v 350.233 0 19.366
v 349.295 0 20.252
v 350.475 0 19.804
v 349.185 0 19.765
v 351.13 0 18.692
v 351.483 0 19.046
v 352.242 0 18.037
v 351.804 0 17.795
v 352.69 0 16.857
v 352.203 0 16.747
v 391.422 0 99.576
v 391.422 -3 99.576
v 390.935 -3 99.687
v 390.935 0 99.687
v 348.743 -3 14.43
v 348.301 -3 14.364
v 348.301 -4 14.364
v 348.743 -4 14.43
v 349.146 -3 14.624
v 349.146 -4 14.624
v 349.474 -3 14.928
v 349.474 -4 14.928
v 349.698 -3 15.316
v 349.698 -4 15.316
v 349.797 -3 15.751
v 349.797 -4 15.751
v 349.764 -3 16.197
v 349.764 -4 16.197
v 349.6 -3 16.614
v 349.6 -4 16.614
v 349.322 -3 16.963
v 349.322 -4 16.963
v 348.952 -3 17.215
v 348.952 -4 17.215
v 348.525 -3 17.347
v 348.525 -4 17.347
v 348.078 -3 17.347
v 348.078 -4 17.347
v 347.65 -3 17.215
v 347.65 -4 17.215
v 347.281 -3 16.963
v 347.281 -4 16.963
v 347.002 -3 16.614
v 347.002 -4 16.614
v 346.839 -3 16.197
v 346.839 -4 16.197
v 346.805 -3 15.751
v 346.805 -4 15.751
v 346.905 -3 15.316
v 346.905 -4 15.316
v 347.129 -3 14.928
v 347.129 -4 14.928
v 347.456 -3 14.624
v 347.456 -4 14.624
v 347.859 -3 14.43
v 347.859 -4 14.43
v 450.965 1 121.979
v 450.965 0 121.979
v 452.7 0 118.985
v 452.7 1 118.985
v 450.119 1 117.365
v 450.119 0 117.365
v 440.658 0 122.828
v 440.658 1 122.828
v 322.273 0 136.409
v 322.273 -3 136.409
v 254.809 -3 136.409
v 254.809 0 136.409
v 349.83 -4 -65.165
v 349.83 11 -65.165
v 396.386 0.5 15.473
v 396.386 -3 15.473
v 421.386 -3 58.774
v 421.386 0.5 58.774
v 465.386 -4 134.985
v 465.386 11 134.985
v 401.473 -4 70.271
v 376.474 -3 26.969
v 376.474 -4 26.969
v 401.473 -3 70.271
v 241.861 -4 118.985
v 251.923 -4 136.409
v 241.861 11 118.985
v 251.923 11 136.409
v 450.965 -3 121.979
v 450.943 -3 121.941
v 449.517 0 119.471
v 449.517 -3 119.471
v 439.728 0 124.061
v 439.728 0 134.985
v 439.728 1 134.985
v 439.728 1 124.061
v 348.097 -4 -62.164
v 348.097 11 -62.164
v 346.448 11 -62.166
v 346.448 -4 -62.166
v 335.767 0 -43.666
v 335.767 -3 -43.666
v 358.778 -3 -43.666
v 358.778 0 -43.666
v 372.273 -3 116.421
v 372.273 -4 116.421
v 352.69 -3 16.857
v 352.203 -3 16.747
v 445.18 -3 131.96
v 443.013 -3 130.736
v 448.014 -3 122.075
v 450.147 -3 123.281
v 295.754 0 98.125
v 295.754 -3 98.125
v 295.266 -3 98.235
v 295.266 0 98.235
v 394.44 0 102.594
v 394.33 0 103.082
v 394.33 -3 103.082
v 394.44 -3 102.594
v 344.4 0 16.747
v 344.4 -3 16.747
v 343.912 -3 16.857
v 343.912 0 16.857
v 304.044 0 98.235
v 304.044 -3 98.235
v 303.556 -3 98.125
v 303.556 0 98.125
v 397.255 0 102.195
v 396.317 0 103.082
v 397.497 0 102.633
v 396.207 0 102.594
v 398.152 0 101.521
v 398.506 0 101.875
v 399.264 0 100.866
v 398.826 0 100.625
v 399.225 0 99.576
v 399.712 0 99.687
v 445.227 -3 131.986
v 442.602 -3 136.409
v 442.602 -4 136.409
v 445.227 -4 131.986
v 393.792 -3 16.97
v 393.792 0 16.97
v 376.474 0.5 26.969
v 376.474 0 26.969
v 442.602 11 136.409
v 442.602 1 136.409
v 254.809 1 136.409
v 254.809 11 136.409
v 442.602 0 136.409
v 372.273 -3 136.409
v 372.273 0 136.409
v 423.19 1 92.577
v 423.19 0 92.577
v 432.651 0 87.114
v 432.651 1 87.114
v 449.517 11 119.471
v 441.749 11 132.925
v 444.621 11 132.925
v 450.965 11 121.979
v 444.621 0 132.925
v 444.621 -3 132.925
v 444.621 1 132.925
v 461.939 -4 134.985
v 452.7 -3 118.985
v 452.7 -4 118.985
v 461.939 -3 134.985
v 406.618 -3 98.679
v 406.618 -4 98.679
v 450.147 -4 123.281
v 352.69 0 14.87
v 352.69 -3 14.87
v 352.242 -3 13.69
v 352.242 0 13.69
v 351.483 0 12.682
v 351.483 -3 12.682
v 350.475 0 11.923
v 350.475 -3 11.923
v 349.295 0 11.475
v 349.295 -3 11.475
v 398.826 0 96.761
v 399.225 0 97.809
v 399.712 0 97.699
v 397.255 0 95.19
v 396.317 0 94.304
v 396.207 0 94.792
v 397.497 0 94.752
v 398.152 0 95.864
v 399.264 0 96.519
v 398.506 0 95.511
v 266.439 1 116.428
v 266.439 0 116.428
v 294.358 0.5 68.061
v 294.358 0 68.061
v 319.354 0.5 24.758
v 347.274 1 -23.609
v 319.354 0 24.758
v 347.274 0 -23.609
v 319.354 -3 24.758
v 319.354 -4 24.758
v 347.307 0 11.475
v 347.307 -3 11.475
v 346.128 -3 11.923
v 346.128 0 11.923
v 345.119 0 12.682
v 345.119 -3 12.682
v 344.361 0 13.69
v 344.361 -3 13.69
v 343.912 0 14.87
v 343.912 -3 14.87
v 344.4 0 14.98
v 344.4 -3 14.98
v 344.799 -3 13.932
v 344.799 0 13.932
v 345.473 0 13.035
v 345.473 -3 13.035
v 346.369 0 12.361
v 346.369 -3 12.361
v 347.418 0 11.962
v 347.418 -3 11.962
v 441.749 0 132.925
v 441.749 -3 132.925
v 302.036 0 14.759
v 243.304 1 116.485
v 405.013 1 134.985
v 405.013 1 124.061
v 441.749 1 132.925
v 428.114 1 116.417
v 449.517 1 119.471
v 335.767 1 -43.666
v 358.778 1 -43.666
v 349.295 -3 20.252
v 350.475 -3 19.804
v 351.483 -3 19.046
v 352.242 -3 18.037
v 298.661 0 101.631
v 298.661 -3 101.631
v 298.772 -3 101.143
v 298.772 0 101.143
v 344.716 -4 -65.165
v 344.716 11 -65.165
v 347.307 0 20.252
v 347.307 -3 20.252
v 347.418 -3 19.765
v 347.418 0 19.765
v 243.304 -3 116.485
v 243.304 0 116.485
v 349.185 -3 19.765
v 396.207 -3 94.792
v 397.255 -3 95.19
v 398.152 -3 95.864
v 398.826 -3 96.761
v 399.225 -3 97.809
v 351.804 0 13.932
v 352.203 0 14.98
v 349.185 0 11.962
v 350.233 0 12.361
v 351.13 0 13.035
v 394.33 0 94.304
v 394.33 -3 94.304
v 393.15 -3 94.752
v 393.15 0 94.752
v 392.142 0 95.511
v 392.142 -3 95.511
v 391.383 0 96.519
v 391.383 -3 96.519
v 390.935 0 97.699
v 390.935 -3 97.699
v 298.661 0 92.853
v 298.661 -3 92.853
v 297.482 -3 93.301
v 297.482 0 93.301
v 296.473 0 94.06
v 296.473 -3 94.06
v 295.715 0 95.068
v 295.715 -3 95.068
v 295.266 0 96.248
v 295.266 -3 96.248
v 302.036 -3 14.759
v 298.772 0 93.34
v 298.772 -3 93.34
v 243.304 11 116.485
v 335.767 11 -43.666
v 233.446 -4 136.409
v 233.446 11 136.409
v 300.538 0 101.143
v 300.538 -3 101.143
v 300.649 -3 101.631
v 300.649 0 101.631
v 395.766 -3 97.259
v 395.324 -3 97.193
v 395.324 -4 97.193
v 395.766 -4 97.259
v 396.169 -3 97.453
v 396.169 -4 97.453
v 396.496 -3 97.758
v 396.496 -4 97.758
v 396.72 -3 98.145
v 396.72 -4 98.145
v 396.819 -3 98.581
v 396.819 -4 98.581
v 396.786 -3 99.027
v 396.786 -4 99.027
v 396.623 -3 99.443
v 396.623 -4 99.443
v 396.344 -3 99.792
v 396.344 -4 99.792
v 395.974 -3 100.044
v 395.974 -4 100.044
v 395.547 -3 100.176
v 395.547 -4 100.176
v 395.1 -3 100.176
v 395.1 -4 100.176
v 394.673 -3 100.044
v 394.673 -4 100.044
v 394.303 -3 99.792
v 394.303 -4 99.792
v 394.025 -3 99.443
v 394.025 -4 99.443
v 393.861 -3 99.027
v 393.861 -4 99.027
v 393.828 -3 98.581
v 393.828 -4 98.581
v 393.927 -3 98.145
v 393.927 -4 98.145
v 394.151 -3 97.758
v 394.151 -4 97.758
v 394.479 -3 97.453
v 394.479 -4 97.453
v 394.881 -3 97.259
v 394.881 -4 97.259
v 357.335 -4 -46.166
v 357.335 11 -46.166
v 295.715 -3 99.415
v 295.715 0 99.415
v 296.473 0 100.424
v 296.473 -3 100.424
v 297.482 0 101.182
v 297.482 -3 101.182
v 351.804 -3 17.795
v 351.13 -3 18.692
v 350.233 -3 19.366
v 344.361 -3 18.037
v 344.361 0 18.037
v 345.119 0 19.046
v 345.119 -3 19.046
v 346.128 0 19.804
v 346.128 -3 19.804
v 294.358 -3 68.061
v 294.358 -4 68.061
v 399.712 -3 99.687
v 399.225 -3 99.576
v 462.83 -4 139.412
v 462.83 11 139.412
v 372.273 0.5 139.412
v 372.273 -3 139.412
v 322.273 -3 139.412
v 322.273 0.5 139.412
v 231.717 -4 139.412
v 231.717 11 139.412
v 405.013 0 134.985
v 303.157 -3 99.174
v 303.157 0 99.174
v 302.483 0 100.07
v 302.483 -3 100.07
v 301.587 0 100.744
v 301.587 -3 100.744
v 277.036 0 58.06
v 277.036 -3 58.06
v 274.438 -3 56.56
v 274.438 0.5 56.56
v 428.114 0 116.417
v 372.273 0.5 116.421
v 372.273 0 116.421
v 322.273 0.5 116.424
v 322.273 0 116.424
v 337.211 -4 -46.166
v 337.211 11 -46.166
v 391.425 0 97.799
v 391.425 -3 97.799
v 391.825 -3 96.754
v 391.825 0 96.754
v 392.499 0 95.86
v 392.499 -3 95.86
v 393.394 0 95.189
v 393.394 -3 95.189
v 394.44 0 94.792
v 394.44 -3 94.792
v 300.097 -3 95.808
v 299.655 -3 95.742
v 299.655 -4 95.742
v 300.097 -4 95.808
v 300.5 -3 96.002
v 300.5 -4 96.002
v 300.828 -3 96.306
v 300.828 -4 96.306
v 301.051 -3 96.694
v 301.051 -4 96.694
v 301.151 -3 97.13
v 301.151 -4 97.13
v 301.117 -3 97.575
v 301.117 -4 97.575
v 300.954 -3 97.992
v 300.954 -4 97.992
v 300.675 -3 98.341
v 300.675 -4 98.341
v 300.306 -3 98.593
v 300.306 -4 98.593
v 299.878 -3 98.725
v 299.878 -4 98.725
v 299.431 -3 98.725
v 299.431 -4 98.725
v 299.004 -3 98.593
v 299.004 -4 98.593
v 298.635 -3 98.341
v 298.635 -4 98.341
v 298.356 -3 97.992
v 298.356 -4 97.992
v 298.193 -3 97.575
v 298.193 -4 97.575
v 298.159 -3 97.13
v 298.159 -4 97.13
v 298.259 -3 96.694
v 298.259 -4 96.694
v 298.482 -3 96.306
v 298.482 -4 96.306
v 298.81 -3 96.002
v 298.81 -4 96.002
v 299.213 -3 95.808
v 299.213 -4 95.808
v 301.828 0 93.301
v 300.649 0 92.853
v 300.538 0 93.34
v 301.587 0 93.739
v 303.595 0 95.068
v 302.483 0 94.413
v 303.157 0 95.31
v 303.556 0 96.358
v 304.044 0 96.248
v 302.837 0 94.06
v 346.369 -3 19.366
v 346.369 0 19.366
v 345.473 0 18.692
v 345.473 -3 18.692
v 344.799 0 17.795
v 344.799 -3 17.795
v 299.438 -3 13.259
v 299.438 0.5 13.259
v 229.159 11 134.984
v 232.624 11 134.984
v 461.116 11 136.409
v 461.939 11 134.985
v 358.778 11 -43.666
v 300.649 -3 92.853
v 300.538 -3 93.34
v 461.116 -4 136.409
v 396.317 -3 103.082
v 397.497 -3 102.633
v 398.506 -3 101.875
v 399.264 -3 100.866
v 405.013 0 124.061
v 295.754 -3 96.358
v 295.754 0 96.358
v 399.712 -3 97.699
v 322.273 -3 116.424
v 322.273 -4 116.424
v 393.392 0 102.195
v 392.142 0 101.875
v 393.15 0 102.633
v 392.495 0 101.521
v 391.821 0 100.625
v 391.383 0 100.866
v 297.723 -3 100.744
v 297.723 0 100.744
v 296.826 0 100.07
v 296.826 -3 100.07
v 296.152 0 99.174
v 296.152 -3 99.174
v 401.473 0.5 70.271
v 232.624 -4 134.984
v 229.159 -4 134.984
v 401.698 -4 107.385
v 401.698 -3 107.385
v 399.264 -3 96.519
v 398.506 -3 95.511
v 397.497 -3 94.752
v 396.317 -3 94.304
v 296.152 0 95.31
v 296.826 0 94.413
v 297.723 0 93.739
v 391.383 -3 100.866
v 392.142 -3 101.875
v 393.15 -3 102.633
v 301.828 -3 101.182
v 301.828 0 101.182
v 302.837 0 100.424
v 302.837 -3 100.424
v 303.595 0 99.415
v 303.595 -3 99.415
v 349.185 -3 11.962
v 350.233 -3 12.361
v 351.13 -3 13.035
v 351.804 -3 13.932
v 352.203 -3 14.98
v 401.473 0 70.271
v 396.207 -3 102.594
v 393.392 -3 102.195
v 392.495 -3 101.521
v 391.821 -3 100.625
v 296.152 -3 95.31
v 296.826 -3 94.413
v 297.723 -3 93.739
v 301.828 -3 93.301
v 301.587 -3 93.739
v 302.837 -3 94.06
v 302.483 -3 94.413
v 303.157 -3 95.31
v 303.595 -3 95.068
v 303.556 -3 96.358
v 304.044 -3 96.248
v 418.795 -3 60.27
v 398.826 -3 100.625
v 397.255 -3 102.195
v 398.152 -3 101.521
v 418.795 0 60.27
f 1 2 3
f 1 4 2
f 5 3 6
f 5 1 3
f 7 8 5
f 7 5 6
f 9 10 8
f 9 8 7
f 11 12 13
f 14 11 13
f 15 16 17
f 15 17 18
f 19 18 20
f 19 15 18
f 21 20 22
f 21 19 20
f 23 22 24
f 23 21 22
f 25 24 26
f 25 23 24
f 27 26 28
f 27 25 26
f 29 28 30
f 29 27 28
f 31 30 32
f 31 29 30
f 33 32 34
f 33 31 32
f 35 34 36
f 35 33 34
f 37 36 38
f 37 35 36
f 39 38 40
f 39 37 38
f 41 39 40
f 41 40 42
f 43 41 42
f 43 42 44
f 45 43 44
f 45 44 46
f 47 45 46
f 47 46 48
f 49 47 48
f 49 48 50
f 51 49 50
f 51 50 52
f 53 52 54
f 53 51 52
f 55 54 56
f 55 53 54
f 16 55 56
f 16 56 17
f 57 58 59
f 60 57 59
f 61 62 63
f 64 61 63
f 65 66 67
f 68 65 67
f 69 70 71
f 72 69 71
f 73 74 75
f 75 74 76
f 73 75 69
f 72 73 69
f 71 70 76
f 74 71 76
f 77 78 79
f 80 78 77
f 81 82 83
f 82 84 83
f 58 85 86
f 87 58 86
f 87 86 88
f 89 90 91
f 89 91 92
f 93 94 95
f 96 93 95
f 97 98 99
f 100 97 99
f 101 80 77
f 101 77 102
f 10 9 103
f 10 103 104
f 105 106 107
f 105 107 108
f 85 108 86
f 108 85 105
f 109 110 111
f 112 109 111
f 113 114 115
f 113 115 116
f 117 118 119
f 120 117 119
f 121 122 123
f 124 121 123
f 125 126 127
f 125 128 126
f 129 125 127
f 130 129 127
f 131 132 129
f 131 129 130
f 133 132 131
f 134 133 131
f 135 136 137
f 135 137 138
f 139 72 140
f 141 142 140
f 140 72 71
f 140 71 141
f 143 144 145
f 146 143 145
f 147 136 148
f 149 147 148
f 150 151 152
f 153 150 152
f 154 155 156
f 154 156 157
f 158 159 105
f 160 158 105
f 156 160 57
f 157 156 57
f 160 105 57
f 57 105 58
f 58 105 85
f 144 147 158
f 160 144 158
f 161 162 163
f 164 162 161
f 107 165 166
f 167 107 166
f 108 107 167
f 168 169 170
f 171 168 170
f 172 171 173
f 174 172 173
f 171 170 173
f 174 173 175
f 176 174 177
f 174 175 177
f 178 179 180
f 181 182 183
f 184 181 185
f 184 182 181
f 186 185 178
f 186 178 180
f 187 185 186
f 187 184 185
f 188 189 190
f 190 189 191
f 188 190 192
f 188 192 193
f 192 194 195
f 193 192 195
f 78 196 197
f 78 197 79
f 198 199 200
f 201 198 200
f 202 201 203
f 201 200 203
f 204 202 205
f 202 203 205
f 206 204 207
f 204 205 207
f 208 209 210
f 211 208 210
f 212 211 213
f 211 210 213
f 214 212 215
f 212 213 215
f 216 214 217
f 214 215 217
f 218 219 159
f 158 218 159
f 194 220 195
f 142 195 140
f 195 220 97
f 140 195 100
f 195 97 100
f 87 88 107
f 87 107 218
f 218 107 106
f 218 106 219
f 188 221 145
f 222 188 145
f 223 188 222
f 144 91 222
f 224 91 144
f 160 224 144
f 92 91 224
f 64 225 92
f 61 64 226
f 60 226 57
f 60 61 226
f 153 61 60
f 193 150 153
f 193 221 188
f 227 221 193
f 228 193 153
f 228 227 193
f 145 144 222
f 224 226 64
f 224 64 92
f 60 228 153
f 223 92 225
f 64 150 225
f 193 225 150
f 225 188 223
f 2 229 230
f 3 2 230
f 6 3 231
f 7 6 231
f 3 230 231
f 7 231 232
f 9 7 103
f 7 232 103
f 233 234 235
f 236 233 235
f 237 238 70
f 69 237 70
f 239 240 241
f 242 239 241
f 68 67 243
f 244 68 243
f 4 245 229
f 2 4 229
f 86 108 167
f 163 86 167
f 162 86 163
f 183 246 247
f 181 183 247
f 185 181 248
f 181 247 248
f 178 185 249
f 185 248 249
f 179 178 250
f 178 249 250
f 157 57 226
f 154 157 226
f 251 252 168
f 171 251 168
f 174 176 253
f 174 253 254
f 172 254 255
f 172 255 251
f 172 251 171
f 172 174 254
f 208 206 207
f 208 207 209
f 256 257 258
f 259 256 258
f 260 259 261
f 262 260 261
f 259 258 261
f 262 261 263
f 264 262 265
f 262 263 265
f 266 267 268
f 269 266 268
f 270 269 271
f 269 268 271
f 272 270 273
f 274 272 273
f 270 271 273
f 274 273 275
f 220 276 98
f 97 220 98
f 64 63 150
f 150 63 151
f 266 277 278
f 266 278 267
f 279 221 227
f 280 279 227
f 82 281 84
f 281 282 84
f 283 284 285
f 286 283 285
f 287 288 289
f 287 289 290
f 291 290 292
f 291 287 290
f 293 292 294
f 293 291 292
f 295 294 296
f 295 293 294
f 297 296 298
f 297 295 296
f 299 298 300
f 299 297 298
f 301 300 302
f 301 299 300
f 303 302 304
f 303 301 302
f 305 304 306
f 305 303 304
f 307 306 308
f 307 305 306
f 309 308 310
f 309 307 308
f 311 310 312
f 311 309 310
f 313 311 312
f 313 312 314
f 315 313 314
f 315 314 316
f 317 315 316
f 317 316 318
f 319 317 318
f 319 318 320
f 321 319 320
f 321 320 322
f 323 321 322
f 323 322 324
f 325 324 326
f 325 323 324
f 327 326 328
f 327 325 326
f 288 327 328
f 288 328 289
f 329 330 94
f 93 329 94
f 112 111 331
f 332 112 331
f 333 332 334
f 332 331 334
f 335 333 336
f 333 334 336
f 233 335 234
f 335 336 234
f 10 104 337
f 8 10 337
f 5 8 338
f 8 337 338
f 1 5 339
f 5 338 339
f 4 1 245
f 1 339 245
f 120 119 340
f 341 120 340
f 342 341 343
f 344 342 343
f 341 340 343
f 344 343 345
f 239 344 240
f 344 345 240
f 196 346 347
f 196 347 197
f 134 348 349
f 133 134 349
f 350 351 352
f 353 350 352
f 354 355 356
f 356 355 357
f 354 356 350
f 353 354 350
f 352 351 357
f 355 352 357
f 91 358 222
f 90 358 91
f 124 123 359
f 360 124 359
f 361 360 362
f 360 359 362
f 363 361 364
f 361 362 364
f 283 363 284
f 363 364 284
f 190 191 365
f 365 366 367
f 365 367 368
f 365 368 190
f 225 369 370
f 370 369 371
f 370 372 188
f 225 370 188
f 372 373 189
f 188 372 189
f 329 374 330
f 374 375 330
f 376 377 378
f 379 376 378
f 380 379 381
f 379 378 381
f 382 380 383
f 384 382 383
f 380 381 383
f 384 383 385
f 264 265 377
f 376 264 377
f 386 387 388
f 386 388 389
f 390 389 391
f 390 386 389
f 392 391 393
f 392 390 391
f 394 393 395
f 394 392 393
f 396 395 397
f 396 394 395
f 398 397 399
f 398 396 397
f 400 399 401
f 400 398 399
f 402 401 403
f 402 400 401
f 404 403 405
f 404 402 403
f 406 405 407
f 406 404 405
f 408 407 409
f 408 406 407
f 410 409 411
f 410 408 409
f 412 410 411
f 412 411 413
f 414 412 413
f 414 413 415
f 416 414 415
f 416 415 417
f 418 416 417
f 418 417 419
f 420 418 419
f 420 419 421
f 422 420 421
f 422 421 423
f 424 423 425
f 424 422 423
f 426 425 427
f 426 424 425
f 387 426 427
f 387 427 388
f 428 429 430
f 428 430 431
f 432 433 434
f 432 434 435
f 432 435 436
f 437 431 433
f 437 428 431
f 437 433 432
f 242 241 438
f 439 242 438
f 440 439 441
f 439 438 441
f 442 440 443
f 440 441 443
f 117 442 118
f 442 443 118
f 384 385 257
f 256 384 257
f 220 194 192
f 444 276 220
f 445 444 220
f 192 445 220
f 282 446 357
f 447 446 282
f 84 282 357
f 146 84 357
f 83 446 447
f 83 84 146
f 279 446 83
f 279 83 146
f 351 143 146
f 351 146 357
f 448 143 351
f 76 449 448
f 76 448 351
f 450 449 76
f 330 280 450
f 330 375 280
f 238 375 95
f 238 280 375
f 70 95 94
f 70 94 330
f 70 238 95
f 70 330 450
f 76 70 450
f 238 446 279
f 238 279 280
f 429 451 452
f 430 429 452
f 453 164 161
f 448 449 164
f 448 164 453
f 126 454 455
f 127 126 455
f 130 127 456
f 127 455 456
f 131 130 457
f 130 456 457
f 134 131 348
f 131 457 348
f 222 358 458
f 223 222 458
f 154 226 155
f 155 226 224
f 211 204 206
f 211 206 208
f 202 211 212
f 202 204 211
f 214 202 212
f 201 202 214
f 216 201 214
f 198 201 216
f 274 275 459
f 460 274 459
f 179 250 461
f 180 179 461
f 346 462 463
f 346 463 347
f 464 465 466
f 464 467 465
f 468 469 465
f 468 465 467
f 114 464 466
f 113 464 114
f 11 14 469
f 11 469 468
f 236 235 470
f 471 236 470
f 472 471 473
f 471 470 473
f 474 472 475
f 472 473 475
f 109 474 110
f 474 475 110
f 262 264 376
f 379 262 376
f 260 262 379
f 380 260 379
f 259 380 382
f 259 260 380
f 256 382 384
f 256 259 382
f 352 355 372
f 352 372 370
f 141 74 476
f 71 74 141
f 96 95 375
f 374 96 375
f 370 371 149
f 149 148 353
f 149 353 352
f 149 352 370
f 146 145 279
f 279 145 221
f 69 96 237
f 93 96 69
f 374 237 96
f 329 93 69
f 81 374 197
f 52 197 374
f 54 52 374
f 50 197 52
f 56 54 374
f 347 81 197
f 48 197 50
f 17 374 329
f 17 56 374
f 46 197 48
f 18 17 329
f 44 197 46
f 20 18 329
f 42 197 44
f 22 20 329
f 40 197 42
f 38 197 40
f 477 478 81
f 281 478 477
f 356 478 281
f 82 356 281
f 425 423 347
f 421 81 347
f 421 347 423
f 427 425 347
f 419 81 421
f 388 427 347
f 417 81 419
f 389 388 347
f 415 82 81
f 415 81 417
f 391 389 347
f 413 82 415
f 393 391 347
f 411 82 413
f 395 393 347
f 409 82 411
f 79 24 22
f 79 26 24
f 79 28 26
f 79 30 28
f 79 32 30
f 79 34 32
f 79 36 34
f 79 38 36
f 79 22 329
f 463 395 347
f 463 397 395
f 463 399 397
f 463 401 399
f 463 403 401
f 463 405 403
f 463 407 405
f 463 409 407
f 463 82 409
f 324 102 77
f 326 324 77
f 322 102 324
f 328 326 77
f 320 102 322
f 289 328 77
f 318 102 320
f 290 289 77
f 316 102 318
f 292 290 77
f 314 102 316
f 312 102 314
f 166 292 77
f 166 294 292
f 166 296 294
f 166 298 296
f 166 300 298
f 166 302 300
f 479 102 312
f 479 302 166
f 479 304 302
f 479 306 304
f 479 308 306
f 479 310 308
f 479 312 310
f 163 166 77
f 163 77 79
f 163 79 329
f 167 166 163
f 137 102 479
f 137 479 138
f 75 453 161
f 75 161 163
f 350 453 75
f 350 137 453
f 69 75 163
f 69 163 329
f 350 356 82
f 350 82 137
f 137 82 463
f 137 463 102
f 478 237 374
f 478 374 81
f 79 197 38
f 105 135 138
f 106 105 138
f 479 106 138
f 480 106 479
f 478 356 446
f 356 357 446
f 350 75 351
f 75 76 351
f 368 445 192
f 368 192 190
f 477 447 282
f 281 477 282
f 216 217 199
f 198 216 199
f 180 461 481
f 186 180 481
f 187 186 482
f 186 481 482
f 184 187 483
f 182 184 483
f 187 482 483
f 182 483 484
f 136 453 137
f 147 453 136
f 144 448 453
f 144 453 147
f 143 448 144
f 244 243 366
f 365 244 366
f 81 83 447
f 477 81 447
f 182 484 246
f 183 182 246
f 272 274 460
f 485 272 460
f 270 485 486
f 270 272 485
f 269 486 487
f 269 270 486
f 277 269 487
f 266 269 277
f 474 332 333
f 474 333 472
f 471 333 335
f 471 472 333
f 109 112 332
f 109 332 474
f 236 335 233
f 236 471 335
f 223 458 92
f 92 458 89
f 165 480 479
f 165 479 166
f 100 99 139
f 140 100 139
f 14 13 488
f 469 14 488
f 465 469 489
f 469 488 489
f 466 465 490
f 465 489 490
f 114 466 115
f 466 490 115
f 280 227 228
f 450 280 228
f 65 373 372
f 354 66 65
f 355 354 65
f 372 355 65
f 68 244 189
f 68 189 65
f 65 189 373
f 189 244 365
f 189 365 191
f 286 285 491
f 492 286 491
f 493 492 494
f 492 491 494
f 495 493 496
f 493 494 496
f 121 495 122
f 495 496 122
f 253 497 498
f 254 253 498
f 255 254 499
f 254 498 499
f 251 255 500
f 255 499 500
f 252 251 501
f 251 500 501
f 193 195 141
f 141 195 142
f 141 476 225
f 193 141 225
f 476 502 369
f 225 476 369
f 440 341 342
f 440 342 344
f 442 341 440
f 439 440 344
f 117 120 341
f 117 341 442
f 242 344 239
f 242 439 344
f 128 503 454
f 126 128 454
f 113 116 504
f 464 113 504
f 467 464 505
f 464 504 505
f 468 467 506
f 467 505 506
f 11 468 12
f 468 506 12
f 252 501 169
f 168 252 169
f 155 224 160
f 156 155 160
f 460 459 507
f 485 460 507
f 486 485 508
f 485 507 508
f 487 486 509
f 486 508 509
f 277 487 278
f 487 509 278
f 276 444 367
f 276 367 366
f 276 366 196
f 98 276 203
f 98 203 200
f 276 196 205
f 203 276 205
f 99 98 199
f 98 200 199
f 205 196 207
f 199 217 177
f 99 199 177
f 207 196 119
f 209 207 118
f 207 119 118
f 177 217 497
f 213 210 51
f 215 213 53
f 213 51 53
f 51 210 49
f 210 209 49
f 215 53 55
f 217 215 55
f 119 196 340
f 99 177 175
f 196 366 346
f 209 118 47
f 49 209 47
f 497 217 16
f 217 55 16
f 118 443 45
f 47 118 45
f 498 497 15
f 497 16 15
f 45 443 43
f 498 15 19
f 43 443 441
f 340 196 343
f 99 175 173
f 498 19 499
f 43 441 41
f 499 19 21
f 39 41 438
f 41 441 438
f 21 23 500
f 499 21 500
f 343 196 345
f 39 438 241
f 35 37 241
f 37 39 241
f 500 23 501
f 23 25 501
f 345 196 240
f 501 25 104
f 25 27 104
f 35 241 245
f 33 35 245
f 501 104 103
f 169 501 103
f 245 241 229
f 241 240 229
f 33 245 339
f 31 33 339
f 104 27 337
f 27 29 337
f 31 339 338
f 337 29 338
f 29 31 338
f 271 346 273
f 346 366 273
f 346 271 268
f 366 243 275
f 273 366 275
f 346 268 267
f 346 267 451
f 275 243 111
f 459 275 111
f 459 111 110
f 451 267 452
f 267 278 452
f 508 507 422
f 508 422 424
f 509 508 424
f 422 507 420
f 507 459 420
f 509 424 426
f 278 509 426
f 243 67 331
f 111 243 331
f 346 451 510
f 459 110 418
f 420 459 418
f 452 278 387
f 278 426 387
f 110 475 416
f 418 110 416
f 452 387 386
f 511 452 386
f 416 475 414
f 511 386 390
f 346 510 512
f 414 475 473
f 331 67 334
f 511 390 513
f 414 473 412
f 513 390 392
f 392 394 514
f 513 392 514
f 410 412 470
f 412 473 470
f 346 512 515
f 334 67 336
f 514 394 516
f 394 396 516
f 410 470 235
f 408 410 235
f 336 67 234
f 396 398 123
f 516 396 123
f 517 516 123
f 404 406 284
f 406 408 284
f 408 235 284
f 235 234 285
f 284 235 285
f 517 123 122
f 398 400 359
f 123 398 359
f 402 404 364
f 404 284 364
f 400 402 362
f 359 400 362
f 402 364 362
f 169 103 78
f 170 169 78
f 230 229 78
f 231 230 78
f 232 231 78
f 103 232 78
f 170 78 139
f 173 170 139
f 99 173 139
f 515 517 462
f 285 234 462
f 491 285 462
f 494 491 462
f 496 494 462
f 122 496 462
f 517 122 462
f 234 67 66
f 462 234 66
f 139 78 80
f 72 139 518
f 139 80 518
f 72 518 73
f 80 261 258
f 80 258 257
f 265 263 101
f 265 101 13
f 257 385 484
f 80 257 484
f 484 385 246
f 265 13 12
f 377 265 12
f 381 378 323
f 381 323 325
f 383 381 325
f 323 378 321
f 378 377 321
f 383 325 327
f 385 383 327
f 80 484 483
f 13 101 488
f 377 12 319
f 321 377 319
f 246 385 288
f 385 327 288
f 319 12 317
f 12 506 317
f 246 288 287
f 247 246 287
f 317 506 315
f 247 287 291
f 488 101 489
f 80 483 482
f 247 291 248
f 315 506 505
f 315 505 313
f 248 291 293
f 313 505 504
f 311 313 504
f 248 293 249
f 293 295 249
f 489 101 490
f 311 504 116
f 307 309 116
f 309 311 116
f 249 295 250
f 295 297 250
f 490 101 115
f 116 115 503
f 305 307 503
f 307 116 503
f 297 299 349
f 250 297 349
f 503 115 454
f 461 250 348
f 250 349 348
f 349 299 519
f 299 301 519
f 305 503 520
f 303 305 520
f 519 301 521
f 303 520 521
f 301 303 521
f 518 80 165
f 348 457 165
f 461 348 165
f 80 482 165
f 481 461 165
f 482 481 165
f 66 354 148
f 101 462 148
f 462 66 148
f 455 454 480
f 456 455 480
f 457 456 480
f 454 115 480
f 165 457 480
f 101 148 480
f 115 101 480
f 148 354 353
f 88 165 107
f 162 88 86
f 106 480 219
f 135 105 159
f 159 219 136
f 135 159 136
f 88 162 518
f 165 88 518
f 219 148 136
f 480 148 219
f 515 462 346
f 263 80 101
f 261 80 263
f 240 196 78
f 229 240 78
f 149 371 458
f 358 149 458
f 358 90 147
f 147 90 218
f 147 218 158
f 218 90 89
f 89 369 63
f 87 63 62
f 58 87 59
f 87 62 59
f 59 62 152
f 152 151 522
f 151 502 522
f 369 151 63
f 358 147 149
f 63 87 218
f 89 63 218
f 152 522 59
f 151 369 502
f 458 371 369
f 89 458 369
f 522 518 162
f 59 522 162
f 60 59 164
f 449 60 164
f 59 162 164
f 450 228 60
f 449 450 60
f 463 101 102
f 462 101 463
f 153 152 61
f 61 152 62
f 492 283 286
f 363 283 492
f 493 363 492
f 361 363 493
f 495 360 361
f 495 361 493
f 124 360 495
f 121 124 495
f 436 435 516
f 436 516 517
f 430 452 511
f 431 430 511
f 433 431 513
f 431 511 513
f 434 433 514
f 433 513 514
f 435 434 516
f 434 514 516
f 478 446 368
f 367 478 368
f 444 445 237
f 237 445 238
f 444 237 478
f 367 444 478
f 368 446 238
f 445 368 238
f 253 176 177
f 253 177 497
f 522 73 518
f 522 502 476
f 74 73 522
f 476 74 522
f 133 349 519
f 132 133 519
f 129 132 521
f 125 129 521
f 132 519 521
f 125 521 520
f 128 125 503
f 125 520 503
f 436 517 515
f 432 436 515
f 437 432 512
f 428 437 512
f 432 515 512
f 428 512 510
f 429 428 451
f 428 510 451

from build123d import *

# Parameters (mm, degrees)
SKETCH1_W                = 34.714871787
SKETCH1_H                = 10.923666426
BOSS_EXTRUDE1_DEPTH      = 1
BOSS_EXTRUDE2_DEPTH      = 11
BOSS_EXTRUDE3_DEPTH      = 5
BOSS_EXTRUDE3_DEPTH_BACK = 3
SKETCH3_W                = 50
SKETCH3_H                = 7
CUT_EXTRUDE3_DEPTH       = 25
SKETCH5_W                = 50
SKETCH5_H                = 7
CUT_EXTRUDE4_DEPTH       = 25
SKETCH6_W                = 50
SKETCH6_H                = 7
CUT_EXTRUDE5_DEPTH       = 25
SKETCH8_R                = 1.5
BOSS_EXTRUDE5_DEPTH      = 1
BOSS_EXTRUDE10_DEPTH     = 3


with BuildPart() as part:
    # Sketch1 → Boss-Extrude1 (new body)
    with BuildSketch(Plane(origin=(0, 0, 0), x_dir=(1, 0, 0), z_dir=(0, 1, 0))):
        Polygon((243.304219775, -116.484791865), (254.809280577, -136.408896137), (442.602090749, -136.409305398), (444.621046679, -132.925433224), (441.749040748, -132.925433224), (449.516726724, -119.471406458), (450.964695298, -121.978953123), (452.699916622, -118.984688018), (358.778179036, 43.666038065), (335.767496284, 43.666038065), align=None)
        with Locations((422.370878913, -129.522754792)):
            Rectangle(SKETCH1_W, SKETCH1_H, mode=Mode.SUBTRACT)
        Polygon((423.190377512, -92.577472767), (432.651287025, -87.114324326), (450.119365975, -117.364996826), (440.658456462, -122.828145267), align=None, mode=Mode.SUBTRACT)
        Polygon((428.113670919, -116.417164681), (266.439108268, -116.428009237), (347.273609729, 23.609230821), align=None, mode=Mode.SUBTRACT)
    extrude(amount=BOSS_EXTRUDE1_DEPTH)

    # Sketch1<9> → Boss-Extrude2 (add)
    # profile 1 of 2: a face of its own
    with BuildSketch(Plane(origin=(0, 0, 0), x_dir=(1, 0, 0), z_dir=(0, 1, 0))):
        Polygon((229.159432548, -134.984249184), (231.716666588, -139.412373829), (462.829865412, -139.412373829), (465.38624875, -134.984588004), (349.829542096, 65.165499075), (344.716133219, 65.165499075), align=None)
        Polygon((251.922647989, -136.409305399), (233.446303401, -136.408896138), (232.62355396, -134.984217357), (241.860901689, -118.984688018), align=None, mode=Mode.SUBTRACT)
        Polygon((442.602090749, -136.409305398), (254.809280577, -136.408896137), (243.304219775, -116.484791865), (335.767496284, 43.666038065), (358.778179036, 43.666038065), (461.938967958, -134.984588006), (461.116393749, -136.409305398), align=None, mode=Mode.SUBTRACT)
        Polygon((348.096628302, 62.164013367), (357.334800991, 46.166038067), (337.210874326, 46.166038067), (346.44844193, 62.165948237), align=None, mode=Mode.SUBTRACT)
    # profile 2 of 2: a face of its own
    with BuildSketch(Plane(origin=(0, 0, 0), x_dir=(1, 0, 0), z_dir=(0, 1, 0))):
        Polygon((441.749040748, -132.925433224), (444.621046679, -132.925433224), (450.964695298, -121.978953123), (449.516726724, -119.471406458), align=None)
    extrude(amount=BOSS_EXTRUDE2_DEPTH)

    # Sketch1<10> → Boss-Extrude3 (add, two sides: drawn at the far end of the back side and taken through both)
    # profile 1 of 2: a face of its own
    with BuildSketch(Plane(origin=(0, 0, 0), x_dir=(1, 0, 0), z_dir=(0, 1, 0)).offset(-BOSS_EXTRUDE3_DEPTH_BACK)):
        Polygon((229.159432548, -134.984249184), (231.716666588, -139.412373829), (462.829865412, -139.412373829), (465.38624875, -134.984588004), (349.829542096, 65.165499075), (344.716133219, 65.165499075), align=None)
        Polygon((251.922647989, -136.409305399), (233.446303401, -136.408896138), (232.62355396, -134.984217357), (241.860901689, -118.984688018), align=None, mode=Mode.SUBTRACT)
        Polygon((442.602090749, -136.409305398), (254.809280577, -136.408896137), (243.304219775, -116.484791865), (335.767496284, 43.666038065), (358.778179036, 43.666038065), (461.938967958, -134.984588006), (461.116393749, -136.409305398), align=None, mode=Mode.SUBTRACT)
        Polygon((348.096628302, 62.164013367), (357.334800991, 46.166038067), (337.210874326, 46.166038067), (346.44844193, 62.165948237), align=None, mode=Mode.SUBTRACT)
    # profile 2 of 2: a face of its own
    with BuildSketch(Plane(origin=(0, 0, 0), x_dir=(1, 0, 0), z_dir=(0, 1, 0)).offset(-BOSS_EXTRUDE3_DEPTH_BACK)):
        Polygon((441.749040748, -132.925433224), (444.621046679, -132.925433224), (450.964695298, -121.978953123), (449.516726724, -119.471406458), align=None)
    extrude(amount=BOSS_EXTRUDE3_DEPTH + BOSS_EXTRUDE3_DEPTH_BACK)

    # Sketch3 → Cut-Extrude3 (cut)
    with BuildSketch(Plane(origin=(290.589645397, 0, -167.772009994), x_dir=(-0.49999999999998745, 0, -0.8660254037844459), z_dir=(0.8660254037844459, 0, -0.49999999999998745))):
        with Locations((-236.592990632, -3)):
            Rectangle(SKETCH3_W, SKETCH3_H)
    extrude(amount=-CUT_EXTRUDE3_DEPTH, mode=Mode.SUBTRACT)

    # Sketch5 → Cut-Extrude4 (cut)
    with BuildSketch(Plane.XY.offset(139.412373829)):
        with Locations((347.273266, -3)):
            Rectangle(SKETCH5_W, SKETCH5_H)
    extrude(amount=-CUT_EXTRUDE4_DEPTH, mode=Mode.SUBTRACT)

    # Sketch6 → Cut-Extrude5 (cut)
    with BuildSketch(Plane(origin=(230.319375798, 0, 132.975171837), x_dir=(-0.5000006154012504, 0, 0.8660250484820695), z_dir=(-0.8660250484820695, 0, -0.5000006154012504))):
        with Locations((-113.236674799, -3)):
            Rectangle(SKETCH6_W, SKETCH6_H)
    extrude(amount=-CUT_EXTRUDE5_DEPTH, mode=Mode.SUBTRACT)

    # Sketch8 → Boss-Extrude5 (add)
    with BuildSketch(Plane.XZ.offset(3)):
        Polygon((349.829542096, -65.165499075), (465.38624875, 134.984588004), (462.829865412, 139.412373829), (231.716666588, 139.412373829), (229.159432548, 134.984249184), (344.716133219, -65.165499075), align=None)
        with Locations((395.323540807, 98.692824234)):
            Circle(SKETCH8_R, mode=Mode.SUBTRACT)
        with Locations((348.301285091, 15.863526629)):
            Circle(SKETCH8_R, mode=Mode.SUBTRACT)
        with Locations((299.654911442, 97.24168178)):
            Circle(SKETCH8_R, mode=Mode.SUBTRACT)
        Polygon((450.14703547, 123.280701064), (452.699916622, 118.984688018), (461.938967958, 134.984588006), (461.116393749, 136.409305398), (442.602090749, 136.409305398), (445.226665069, 131.986443715), (401.697951811, 107.384591709), (406.618322213, 98.678849058), align=None, mode=Mode.SUBTRACT)
        Polygon((322.273266, 116.42426408), (294.358218631, 68.061097964), (319.354499367, 24.757680453), (376.473657316, 26.969372806), (401.47267951, 70.271207531), (372.273266, 116.420910257), align=None, mode=Mode.SUBTRACT)
        Polygon((233.446303401, 136.408896138), (251.922647989, 136.409305399), (241.860901689, 118.984688018), (232.62355396, 134.984217357), align=None, mode=Mode.SUBTRACT)
        Polygon((337.210874326, -46.166038067), (357.334800991, -46.166038067), (348.096628302, -62.164013367), (346.44844193, -62.165948237), align=None, mode=Mode.SUBTRACT)
    extrude(amount=BOSS_EXTRUDE5_DEPTH)

    # Sketch12 → Boss-Extrude10 (add)
    with BuildSketch(Plane(origin=(0, -3, 0), x_dir=(1, 0, 0), z_dir=(0, 1, 0))):
        with BuildLine():
            ThreePointArc((352.690173981, -14.869718639), (351.483265607, -12.681546114), (349.295093082, -11.47463774))
            Line((349.295093081, -11.47463774), (349.184669971, -11.962292061))
            ThreePointArc((349.184669972, -11.962292061), (351.129712216, -13.035099504), (352.20251966, -14.980141749))
            Line((352.202519659, -14.980141749), (352.69017398, -14.869718639))
        make_face()
        with BuildLine():
            Line((347.417900211, -11.962292061), (347.307477101, -11.47463774))
            ThreePointArc((347.307477101, -11.47463774), (345.119304576, -12.681546114), (343.912396202, -14.869718639))
            Line((343.912396203, -14.869718639), (344.400050524, -14.980141749))
            ThreePointArc((344.400050523, -14.980141749), (345.472857967, -13.035099504), (347.417900211, -11.962292061))
        make_face()
        with BuildLine():
            ThreePointArc((349.295093082, -20.252415518), (351.483265607, -19.045507145), (352.690173981, -16.857334619))
            Line((352.69017398, -16.857334619), (352.202519659, -16.746911509))
            ThreePointArc((352.20251966, -16.746911509), (351.129712216, -18.691953754), (349.184669972, -19.764761197))
            Line((349.184669971, -19.764761197), (349.295093081, -20.252415518))
        make_face()
        with BuildLine():
            Line((344.400050524, -16.746911509), (343.912396203, -16.857334619))
            ThreePointArc((343.912396202, -16.857334619), (345.119304576, -19.045507145), (347.307477101, -20.252415518))
            Line((347.307477101, -20.252415518), (347.417900211, -19.764761197))
            ThreePointArc((347.417900211, -19.764761197), (345.472857967, -18.691953754), (344.400050523, -16.746911509))
        make_face()
        with BuildLine():
            Line((394.440155927, -94.791589666), (394.329732817, -94.303935345))
            ThreePointArc((394.329732817, -94.303935345), (392.141560292, -95.510843718), (390.934651918, -97.699016244))
            Line((390.934651918, -97.699016244), (391.4247896, -97.798542945))
            ThreePointArc((391.4247896, -97.798542945), (392.499067689, -95.860448622), (394.440155927, -94.791589666))
        make_face()
        with BuildLine():
            ThreePointArc((399.712429696, -97.699016244), (398.505521323, -95.510843718), (396.317348797, -94.303935345))
            Line((396.317348797, -94.303935345), (396.206925687, -94.791589666))
            ThreePointArc((396.206925687, -94.791589666), (398.151967932, -95.864397109), (399.224775375, -97.809439354))
            Line((399.224775375, -97.809439354), (399.712429696, -97.699016244))
        make_face()
        with BuildLine():
            Line((391.422306239, -99.576209114), (390.934651918, -99.686632224))
            ThreePointArc((390.934651918, -99.686632224), (392.141560292, -101.874804749), (394.329732817, -103.081713123))
            Line((394.329732817, -103.081713122), (394.440155927, -102.594058801))
            ThreePointArc((394.440155927, -102.594058802), (392.495113682, -101.521251358), (391.422306239, -99.576209114))
        make_face()
        with BuildLine():
            ThreePointArc((396.317348797, -103.081713123), (398.505521323, -101.874804749), (399.712429696, -99.686632224))
            Line((399.712429696, -99.686632224), (399.224775375, -99.576209114))
            ThreePointArc((399.224775375, -99.576209114), (398.151967932, -101.521251358), (396.206925687, -102.594058802))
            Line((396.206925687, -102.594058801), (396.317348797, -103.081713122))
        make_face()
        with BuildLine():
            ThreePointArc((298.661103452, -92.852792892), (296.472930927, -94.059701265), (295.266022553, -96.24787379))
            Line((295.266022553, -96.24787379), (295.753676874, -96.3582969))
            ThreePointArc((295.753676874, -96.3582969), (296.826484317, -94.413254656), (298.771526562, -93.340447213))
            Line((298.771526562, -93.340447212), (298.661103452, -92.852792891))
        make_face()
        with BuildLine():
            Line((295.753676874, -98.12506666), (295.266022553, -98.23548977))
            ThreePointArc((295.266022553, -98.23548977), (296.472930927, -100.423662295), (298.661103452, -101.630570669))
            Line((298.661103452, -101.630570669), (298.771526562, -101.142916348))
            ThreePointArc((298.771526562, -101.142916348), (296.826484317, -100.070108905), (295.753676874, -98.12506666))
        make_face()
        with BuildLine():
            ThreePointArc((304.04380033, -96.24787379), (302.836891957, -94.059701265), (300.648719432, -92.852792892))
            Line((300.648719432, -92.852792891), (300.538296322, -93.340447212))
            ThreePointArc((300.538296322, -93.340447213), (302.483338566, -94.413254656), (303.55614601, -96.3582969))
            Line((303.55614601, -96.3582969), (304.043800331, -96.24787379))
        make_face()
        with BuildLine():
            Line((300.538296322, -101.142916348), (300.648719432, -101.630570669))
            ThreePointArc((300.648719432, -101.630570669), (302.836891957, -100.423662295), (304.04380033, -98.23548977))
            Line((304.043800331, -98.23548977), (303.55614601, -98.12506666))
            ThreePointArc((303.55614601, -98.12506666), (302.483338566, -100.070108905), (300.538296322, -101.142916348))
        make_face()
    extrude(amount=BOSS_EXTRUDE10_DEPTH)


solid = part.part
